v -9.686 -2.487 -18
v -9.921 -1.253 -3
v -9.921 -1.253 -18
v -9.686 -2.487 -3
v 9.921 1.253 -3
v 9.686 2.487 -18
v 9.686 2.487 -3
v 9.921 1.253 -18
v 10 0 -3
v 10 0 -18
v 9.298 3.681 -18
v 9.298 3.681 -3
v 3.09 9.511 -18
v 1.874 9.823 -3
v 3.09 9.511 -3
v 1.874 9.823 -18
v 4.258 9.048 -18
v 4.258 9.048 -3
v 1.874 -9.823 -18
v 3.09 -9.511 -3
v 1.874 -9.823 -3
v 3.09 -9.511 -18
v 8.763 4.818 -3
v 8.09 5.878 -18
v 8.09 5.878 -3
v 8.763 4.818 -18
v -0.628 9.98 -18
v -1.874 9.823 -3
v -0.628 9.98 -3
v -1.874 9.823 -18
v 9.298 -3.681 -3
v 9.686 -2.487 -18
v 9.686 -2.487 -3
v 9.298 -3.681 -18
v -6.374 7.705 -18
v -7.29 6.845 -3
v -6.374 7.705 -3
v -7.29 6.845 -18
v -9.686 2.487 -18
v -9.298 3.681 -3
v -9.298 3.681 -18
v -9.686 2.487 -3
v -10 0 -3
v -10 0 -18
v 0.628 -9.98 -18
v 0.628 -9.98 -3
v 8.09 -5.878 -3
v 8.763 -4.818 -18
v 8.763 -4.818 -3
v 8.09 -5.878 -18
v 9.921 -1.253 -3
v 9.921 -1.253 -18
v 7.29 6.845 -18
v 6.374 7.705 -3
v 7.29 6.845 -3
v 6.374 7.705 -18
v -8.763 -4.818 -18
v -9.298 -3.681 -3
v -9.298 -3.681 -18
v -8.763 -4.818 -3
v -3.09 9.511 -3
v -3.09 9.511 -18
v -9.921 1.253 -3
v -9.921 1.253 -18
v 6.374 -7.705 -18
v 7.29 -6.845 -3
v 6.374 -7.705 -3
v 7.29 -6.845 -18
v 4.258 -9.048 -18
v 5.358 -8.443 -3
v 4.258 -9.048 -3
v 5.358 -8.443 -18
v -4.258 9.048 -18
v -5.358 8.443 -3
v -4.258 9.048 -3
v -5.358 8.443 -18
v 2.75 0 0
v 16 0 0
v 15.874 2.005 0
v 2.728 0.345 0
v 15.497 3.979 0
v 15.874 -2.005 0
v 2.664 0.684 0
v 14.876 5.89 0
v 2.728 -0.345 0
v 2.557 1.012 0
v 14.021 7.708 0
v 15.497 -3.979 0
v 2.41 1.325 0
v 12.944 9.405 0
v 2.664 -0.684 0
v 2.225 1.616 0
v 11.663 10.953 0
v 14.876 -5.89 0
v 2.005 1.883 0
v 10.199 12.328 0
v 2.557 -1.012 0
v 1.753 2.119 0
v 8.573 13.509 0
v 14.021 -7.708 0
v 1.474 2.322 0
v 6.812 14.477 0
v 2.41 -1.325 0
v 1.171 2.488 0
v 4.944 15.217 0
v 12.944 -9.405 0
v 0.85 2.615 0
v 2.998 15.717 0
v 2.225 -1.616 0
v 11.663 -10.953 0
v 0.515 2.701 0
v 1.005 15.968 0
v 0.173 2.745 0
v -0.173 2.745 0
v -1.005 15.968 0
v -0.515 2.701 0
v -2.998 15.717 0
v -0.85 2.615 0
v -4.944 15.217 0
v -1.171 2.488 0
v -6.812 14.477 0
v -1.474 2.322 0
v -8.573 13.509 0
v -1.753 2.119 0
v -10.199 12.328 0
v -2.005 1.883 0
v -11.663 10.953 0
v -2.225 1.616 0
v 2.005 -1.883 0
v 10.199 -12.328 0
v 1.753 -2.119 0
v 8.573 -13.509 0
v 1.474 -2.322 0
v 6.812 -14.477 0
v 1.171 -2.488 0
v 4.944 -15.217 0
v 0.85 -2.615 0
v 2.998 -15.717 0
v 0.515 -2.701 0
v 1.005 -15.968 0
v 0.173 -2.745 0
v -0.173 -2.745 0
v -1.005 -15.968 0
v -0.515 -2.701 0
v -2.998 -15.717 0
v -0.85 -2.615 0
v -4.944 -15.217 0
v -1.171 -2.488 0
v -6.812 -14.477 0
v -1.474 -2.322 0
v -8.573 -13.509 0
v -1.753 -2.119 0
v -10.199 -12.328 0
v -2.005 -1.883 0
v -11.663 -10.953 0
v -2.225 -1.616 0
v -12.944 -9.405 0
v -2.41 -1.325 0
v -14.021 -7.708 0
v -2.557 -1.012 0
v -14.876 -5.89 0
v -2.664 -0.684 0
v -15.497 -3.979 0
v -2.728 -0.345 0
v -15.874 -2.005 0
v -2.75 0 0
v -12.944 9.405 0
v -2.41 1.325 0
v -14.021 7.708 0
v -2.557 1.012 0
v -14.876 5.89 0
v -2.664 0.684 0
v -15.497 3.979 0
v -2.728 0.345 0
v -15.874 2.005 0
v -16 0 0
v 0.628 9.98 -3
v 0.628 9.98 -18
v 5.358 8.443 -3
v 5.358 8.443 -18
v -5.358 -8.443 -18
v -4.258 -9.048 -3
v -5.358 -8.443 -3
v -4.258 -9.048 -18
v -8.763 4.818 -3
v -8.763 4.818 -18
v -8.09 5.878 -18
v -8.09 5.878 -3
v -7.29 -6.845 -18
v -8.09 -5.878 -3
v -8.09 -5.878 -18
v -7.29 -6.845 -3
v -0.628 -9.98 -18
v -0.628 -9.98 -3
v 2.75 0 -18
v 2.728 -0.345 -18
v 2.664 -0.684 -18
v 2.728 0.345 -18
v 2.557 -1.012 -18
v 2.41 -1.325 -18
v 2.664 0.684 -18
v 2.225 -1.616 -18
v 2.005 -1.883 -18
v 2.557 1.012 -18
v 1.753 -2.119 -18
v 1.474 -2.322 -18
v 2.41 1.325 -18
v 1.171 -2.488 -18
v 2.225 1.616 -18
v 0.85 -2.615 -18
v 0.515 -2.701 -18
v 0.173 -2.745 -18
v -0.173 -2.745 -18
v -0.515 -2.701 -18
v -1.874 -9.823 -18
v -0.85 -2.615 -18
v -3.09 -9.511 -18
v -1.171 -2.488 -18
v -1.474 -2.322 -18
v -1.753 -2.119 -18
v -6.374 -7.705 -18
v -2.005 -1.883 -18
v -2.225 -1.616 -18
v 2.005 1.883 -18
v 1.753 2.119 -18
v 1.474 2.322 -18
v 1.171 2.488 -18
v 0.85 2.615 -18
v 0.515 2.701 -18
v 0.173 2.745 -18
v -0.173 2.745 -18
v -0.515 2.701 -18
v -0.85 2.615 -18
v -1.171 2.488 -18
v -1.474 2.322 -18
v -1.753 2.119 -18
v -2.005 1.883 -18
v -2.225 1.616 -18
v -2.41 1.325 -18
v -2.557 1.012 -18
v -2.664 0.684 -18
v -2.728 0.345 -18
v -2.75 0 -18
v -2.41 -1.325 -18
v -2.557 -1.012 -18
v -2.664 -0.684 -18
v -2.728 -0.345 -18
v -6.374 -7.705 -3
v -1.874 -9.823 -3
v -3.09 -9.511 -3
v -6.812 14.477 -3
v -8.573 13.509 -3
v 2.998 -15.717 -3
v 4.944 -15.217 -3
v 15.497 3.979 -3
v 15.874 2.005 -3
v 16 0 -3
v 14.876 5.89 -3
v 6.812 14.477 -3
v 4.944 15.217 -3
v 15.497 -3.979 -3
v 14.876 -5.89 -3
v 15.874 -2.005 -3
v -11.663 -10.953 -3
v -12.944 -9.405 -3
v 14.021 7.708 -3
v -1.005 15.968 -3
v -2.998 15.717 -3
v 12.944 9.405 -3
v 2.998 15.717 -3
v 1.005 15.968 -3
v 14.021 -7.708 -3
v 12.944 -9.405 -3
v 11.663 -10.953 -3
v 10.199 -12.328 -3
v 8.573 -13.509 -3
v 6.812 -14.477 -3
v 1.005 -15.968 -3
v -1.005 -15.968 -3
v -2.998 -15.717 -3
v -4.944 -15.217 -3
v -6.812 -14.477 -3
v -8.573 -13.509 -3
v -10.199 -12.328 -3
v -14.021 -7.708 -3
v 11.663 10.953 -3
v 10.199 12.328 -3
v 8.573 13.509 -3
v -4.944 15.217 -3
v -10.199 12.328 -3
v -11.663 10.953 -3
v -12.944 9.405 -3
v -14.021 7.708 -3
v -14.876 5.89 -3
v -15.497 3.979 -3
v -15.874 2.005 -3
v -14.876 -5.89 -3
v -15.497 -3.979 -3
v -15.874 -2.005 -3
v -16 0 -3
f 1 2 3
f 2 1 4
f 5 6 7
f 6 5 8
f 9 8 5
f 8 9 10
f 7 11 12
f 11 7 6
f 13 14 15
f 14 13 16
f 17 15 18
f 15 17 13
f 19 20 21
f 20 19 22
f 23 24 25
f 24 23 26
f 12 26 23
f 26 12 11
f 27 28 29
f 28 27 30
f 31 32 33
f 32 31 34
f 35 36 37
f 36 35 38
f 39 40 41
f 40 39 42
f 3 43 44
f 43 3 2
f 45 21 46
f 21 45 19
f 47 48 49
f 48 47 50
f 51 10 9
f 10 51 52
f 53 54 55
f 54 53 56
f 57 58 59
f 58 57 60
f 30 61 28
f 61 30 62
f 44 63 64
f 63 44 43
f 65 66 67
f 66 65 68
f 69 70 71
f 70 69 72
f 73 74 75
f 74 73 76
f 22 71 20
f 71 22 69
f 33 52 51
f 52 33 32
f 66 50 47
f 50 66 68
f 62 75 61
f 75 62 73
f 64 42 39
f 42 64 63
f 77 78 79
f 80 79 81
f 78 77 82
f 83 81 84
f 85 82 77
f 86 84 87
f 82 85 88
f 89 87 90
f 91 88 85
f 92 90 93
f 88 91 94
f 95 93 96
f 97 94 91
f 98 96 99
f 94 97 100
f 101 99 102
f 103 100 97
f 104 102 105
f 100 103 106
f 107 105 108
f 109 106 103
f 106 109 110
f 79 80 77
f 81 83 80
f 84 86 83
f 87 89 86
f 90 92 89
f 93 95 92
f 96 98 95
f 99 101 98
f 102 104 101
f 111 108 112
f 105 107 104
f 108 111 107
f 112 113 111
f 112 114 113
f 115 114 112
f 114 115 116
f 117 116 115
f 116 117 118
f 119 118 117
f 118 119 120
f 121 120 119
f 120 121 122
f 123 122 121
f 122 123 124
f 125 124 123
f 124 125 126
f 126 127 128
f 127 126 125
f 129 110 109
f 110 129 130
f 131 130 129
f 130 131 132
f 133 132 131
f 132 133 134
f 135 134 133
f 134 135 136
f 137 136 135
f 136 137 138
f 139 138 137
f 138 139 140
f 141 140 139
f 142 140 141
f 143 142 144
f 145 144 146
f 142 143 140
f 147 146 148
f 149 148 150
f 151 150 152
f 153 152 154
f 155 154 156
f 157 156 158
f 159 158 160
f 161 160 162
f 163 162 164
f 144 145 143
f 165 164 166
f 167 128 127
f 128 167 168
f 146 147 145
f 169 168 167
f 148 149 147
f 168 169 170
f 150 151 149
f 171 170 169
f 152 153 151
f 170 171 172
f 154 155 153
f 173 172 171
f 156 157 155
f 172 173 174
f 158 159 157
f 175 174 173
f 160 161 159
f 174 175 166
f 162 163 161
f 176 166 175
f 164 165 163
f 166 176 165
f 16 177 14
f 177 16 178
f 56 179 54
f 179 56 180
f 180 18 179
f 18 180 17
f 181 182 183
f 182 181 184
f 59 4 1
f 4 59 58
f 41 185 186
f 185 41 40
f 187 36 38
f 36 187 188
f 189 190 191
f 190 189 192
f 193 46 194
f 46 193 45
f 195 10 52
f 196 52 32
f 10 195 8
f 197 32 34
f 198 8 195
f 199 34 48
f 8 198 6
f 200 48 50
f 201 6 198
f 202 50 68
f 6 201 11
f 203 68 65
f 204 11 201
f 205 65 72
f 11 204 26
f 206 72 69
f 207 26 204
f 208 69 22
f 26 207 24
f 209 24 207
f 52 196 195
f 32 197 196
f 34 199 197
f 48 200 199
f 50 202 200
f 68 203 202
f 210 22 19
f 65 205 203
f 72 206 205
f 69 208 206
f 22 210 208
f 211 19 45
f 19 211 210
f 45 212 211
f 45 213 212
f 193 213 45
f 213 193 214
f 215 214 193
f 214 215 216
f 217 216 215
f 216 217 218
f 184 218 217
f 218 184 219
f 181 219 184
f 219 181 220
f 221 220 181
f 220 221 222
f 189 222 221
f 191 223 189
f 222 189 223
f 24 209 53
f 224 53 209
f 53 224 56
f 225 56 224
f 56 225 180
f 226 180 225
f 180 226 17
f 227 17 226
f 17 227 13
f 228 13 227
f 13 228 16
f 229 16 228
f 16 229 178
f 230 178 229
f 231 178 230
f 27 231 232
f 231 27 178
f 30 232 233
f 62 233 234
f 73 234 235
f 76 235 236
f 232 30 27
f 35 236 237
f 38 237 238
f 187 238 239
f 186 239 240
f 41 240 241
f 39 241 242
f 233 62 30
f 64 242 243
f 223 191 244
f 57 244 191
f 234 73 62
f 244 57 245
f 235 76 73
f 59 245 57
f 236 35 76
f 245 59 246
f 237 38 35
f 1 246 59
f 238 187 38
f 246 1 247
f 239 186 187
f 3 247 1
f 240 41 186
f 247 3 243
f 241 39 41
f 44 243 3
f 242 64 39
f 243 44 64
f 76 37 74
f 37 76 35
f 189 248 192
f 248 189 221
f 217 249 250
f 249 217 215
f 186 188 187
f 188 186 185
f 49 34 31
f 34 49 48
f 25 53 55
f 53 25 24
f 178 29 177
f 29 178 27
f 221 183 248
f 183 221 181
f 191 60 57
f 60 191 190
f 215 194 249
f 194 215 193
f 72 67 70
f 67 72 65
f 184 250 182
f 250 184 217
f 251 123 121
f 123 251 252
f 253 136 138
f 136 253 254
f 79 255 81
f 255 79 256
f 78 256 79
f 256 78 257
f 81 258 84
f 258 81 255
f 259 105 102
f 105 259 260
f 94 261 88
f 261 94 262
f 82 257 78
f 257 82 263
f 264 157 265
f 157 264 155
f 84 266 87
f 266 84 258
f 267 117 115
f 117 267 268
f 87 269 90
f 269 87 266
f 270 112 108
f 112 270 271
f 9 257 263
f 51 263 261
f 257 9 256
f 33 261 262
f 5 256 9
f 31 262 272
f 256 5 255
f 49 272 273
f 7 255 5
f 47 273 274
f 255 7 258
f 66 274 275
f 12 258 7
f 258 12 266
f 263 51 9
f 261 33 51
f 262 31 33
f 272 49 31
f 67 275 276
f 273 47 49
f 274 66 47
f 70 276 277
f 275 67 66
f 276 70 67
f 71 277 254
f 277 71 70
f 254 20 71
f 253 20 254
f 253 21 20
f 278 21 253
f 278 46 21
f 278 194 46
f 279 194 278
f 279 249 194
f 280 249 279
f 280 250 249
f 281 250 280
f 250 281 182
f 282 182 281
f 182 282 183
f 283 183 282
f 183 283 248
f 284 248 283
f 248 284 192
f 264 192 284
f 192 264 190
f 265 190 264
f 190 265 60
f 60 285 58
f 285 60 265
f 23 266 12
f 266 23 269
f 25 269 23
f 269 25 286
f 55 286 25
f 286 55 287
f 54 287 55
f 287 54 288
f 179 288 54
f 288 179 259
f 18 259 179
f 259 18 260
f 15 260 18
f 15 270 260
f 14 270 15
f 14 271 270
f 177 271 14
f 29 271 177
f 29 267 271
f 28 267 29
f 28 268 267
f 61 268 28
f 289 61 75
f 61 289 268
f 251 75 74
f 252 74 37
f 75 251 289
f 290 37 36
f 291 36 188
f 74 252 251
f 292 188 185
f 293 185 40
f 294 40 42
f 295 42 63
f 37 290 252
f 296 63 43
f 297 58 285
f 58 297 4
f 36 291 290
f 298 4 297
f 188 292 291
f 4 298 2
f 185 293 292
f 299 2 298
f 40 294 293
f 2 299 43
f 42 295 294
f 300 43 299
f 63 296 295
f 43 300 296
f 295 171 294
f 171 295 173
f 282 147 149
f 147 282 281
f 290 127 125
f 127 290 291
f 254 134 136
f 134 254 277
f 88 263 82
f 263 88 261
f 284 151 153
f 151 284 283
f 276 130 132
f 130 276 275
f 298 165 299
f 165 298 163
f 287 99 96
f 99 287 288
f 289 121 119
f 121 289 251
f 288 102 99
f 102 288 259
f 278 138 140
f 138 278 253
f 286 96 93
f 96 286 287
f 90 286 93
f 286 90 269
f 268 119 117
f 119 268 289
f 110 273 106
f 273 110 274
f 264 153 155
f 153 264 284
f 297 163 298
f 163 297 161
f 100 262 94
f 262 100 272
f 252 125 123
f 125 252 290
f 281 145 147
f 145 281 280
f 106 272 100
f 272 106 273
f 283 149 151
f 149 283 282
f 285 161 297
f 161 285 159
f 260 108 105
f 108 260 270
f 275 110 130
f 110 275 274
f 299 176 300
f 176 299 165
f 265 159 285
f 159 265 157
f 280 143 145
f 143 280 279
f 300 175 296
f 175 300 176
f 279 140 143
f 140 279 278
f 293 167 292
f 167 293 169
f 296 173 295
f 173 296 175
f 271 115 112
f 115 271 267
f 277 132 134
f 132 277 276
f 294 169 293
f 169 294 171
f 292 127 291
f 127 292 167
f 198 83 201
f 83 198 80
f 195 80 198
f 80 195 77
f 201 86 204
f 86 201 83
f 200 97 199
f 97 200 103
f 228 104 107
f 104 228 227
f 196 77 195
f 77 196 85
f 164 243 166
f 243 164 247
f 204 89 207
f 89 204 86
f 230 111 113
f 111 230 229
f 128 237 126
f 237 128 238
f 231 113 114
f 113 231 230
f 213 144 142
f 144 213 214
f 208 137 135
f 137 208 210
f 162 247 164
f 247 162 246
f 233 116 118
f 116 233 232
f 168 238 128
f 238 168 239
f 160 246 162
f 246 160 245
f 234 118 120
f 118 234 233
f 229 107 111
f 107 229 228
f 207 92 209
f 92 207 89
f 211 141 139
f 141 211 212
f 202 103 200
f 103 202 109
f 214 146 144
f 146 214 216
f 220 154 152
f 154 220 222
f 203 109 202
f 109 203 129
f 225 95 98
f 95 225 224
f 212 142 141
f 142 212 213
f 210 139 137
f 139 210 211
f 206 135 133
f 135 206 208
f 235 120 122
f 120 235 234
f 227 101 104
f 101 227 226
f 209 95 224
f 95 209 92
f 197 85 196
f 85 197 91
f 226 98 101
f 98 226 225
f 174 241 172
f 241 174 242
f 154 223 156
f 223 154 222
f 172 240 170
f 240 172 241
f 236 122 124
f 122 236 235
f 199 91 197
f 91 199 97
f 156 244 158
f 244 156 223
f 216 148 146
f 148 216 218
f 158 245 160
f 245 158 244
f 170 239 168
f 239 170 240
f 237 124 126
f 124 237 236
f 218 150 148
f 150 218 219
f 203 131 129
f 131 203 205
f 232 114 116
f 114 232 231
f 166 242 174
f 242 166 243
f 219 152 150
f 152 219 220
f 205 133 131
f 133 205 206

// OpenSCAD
$fn = 50;


difference() {
	union() {
		translate(v = [0, 0, -18.0000000000]) {
			cylinder(h = 18, r = 10.0000000000);
		}
		translate(v = [0, 0, -3.0000000000]) {
			cylinder(h = 3, r = 16.0000000000);
		}
	}
	union() {
		#translate(v = [0, 0, -18]) {
			cylinder(h = 18, r = 2.7500000000);
		}
	}
}
